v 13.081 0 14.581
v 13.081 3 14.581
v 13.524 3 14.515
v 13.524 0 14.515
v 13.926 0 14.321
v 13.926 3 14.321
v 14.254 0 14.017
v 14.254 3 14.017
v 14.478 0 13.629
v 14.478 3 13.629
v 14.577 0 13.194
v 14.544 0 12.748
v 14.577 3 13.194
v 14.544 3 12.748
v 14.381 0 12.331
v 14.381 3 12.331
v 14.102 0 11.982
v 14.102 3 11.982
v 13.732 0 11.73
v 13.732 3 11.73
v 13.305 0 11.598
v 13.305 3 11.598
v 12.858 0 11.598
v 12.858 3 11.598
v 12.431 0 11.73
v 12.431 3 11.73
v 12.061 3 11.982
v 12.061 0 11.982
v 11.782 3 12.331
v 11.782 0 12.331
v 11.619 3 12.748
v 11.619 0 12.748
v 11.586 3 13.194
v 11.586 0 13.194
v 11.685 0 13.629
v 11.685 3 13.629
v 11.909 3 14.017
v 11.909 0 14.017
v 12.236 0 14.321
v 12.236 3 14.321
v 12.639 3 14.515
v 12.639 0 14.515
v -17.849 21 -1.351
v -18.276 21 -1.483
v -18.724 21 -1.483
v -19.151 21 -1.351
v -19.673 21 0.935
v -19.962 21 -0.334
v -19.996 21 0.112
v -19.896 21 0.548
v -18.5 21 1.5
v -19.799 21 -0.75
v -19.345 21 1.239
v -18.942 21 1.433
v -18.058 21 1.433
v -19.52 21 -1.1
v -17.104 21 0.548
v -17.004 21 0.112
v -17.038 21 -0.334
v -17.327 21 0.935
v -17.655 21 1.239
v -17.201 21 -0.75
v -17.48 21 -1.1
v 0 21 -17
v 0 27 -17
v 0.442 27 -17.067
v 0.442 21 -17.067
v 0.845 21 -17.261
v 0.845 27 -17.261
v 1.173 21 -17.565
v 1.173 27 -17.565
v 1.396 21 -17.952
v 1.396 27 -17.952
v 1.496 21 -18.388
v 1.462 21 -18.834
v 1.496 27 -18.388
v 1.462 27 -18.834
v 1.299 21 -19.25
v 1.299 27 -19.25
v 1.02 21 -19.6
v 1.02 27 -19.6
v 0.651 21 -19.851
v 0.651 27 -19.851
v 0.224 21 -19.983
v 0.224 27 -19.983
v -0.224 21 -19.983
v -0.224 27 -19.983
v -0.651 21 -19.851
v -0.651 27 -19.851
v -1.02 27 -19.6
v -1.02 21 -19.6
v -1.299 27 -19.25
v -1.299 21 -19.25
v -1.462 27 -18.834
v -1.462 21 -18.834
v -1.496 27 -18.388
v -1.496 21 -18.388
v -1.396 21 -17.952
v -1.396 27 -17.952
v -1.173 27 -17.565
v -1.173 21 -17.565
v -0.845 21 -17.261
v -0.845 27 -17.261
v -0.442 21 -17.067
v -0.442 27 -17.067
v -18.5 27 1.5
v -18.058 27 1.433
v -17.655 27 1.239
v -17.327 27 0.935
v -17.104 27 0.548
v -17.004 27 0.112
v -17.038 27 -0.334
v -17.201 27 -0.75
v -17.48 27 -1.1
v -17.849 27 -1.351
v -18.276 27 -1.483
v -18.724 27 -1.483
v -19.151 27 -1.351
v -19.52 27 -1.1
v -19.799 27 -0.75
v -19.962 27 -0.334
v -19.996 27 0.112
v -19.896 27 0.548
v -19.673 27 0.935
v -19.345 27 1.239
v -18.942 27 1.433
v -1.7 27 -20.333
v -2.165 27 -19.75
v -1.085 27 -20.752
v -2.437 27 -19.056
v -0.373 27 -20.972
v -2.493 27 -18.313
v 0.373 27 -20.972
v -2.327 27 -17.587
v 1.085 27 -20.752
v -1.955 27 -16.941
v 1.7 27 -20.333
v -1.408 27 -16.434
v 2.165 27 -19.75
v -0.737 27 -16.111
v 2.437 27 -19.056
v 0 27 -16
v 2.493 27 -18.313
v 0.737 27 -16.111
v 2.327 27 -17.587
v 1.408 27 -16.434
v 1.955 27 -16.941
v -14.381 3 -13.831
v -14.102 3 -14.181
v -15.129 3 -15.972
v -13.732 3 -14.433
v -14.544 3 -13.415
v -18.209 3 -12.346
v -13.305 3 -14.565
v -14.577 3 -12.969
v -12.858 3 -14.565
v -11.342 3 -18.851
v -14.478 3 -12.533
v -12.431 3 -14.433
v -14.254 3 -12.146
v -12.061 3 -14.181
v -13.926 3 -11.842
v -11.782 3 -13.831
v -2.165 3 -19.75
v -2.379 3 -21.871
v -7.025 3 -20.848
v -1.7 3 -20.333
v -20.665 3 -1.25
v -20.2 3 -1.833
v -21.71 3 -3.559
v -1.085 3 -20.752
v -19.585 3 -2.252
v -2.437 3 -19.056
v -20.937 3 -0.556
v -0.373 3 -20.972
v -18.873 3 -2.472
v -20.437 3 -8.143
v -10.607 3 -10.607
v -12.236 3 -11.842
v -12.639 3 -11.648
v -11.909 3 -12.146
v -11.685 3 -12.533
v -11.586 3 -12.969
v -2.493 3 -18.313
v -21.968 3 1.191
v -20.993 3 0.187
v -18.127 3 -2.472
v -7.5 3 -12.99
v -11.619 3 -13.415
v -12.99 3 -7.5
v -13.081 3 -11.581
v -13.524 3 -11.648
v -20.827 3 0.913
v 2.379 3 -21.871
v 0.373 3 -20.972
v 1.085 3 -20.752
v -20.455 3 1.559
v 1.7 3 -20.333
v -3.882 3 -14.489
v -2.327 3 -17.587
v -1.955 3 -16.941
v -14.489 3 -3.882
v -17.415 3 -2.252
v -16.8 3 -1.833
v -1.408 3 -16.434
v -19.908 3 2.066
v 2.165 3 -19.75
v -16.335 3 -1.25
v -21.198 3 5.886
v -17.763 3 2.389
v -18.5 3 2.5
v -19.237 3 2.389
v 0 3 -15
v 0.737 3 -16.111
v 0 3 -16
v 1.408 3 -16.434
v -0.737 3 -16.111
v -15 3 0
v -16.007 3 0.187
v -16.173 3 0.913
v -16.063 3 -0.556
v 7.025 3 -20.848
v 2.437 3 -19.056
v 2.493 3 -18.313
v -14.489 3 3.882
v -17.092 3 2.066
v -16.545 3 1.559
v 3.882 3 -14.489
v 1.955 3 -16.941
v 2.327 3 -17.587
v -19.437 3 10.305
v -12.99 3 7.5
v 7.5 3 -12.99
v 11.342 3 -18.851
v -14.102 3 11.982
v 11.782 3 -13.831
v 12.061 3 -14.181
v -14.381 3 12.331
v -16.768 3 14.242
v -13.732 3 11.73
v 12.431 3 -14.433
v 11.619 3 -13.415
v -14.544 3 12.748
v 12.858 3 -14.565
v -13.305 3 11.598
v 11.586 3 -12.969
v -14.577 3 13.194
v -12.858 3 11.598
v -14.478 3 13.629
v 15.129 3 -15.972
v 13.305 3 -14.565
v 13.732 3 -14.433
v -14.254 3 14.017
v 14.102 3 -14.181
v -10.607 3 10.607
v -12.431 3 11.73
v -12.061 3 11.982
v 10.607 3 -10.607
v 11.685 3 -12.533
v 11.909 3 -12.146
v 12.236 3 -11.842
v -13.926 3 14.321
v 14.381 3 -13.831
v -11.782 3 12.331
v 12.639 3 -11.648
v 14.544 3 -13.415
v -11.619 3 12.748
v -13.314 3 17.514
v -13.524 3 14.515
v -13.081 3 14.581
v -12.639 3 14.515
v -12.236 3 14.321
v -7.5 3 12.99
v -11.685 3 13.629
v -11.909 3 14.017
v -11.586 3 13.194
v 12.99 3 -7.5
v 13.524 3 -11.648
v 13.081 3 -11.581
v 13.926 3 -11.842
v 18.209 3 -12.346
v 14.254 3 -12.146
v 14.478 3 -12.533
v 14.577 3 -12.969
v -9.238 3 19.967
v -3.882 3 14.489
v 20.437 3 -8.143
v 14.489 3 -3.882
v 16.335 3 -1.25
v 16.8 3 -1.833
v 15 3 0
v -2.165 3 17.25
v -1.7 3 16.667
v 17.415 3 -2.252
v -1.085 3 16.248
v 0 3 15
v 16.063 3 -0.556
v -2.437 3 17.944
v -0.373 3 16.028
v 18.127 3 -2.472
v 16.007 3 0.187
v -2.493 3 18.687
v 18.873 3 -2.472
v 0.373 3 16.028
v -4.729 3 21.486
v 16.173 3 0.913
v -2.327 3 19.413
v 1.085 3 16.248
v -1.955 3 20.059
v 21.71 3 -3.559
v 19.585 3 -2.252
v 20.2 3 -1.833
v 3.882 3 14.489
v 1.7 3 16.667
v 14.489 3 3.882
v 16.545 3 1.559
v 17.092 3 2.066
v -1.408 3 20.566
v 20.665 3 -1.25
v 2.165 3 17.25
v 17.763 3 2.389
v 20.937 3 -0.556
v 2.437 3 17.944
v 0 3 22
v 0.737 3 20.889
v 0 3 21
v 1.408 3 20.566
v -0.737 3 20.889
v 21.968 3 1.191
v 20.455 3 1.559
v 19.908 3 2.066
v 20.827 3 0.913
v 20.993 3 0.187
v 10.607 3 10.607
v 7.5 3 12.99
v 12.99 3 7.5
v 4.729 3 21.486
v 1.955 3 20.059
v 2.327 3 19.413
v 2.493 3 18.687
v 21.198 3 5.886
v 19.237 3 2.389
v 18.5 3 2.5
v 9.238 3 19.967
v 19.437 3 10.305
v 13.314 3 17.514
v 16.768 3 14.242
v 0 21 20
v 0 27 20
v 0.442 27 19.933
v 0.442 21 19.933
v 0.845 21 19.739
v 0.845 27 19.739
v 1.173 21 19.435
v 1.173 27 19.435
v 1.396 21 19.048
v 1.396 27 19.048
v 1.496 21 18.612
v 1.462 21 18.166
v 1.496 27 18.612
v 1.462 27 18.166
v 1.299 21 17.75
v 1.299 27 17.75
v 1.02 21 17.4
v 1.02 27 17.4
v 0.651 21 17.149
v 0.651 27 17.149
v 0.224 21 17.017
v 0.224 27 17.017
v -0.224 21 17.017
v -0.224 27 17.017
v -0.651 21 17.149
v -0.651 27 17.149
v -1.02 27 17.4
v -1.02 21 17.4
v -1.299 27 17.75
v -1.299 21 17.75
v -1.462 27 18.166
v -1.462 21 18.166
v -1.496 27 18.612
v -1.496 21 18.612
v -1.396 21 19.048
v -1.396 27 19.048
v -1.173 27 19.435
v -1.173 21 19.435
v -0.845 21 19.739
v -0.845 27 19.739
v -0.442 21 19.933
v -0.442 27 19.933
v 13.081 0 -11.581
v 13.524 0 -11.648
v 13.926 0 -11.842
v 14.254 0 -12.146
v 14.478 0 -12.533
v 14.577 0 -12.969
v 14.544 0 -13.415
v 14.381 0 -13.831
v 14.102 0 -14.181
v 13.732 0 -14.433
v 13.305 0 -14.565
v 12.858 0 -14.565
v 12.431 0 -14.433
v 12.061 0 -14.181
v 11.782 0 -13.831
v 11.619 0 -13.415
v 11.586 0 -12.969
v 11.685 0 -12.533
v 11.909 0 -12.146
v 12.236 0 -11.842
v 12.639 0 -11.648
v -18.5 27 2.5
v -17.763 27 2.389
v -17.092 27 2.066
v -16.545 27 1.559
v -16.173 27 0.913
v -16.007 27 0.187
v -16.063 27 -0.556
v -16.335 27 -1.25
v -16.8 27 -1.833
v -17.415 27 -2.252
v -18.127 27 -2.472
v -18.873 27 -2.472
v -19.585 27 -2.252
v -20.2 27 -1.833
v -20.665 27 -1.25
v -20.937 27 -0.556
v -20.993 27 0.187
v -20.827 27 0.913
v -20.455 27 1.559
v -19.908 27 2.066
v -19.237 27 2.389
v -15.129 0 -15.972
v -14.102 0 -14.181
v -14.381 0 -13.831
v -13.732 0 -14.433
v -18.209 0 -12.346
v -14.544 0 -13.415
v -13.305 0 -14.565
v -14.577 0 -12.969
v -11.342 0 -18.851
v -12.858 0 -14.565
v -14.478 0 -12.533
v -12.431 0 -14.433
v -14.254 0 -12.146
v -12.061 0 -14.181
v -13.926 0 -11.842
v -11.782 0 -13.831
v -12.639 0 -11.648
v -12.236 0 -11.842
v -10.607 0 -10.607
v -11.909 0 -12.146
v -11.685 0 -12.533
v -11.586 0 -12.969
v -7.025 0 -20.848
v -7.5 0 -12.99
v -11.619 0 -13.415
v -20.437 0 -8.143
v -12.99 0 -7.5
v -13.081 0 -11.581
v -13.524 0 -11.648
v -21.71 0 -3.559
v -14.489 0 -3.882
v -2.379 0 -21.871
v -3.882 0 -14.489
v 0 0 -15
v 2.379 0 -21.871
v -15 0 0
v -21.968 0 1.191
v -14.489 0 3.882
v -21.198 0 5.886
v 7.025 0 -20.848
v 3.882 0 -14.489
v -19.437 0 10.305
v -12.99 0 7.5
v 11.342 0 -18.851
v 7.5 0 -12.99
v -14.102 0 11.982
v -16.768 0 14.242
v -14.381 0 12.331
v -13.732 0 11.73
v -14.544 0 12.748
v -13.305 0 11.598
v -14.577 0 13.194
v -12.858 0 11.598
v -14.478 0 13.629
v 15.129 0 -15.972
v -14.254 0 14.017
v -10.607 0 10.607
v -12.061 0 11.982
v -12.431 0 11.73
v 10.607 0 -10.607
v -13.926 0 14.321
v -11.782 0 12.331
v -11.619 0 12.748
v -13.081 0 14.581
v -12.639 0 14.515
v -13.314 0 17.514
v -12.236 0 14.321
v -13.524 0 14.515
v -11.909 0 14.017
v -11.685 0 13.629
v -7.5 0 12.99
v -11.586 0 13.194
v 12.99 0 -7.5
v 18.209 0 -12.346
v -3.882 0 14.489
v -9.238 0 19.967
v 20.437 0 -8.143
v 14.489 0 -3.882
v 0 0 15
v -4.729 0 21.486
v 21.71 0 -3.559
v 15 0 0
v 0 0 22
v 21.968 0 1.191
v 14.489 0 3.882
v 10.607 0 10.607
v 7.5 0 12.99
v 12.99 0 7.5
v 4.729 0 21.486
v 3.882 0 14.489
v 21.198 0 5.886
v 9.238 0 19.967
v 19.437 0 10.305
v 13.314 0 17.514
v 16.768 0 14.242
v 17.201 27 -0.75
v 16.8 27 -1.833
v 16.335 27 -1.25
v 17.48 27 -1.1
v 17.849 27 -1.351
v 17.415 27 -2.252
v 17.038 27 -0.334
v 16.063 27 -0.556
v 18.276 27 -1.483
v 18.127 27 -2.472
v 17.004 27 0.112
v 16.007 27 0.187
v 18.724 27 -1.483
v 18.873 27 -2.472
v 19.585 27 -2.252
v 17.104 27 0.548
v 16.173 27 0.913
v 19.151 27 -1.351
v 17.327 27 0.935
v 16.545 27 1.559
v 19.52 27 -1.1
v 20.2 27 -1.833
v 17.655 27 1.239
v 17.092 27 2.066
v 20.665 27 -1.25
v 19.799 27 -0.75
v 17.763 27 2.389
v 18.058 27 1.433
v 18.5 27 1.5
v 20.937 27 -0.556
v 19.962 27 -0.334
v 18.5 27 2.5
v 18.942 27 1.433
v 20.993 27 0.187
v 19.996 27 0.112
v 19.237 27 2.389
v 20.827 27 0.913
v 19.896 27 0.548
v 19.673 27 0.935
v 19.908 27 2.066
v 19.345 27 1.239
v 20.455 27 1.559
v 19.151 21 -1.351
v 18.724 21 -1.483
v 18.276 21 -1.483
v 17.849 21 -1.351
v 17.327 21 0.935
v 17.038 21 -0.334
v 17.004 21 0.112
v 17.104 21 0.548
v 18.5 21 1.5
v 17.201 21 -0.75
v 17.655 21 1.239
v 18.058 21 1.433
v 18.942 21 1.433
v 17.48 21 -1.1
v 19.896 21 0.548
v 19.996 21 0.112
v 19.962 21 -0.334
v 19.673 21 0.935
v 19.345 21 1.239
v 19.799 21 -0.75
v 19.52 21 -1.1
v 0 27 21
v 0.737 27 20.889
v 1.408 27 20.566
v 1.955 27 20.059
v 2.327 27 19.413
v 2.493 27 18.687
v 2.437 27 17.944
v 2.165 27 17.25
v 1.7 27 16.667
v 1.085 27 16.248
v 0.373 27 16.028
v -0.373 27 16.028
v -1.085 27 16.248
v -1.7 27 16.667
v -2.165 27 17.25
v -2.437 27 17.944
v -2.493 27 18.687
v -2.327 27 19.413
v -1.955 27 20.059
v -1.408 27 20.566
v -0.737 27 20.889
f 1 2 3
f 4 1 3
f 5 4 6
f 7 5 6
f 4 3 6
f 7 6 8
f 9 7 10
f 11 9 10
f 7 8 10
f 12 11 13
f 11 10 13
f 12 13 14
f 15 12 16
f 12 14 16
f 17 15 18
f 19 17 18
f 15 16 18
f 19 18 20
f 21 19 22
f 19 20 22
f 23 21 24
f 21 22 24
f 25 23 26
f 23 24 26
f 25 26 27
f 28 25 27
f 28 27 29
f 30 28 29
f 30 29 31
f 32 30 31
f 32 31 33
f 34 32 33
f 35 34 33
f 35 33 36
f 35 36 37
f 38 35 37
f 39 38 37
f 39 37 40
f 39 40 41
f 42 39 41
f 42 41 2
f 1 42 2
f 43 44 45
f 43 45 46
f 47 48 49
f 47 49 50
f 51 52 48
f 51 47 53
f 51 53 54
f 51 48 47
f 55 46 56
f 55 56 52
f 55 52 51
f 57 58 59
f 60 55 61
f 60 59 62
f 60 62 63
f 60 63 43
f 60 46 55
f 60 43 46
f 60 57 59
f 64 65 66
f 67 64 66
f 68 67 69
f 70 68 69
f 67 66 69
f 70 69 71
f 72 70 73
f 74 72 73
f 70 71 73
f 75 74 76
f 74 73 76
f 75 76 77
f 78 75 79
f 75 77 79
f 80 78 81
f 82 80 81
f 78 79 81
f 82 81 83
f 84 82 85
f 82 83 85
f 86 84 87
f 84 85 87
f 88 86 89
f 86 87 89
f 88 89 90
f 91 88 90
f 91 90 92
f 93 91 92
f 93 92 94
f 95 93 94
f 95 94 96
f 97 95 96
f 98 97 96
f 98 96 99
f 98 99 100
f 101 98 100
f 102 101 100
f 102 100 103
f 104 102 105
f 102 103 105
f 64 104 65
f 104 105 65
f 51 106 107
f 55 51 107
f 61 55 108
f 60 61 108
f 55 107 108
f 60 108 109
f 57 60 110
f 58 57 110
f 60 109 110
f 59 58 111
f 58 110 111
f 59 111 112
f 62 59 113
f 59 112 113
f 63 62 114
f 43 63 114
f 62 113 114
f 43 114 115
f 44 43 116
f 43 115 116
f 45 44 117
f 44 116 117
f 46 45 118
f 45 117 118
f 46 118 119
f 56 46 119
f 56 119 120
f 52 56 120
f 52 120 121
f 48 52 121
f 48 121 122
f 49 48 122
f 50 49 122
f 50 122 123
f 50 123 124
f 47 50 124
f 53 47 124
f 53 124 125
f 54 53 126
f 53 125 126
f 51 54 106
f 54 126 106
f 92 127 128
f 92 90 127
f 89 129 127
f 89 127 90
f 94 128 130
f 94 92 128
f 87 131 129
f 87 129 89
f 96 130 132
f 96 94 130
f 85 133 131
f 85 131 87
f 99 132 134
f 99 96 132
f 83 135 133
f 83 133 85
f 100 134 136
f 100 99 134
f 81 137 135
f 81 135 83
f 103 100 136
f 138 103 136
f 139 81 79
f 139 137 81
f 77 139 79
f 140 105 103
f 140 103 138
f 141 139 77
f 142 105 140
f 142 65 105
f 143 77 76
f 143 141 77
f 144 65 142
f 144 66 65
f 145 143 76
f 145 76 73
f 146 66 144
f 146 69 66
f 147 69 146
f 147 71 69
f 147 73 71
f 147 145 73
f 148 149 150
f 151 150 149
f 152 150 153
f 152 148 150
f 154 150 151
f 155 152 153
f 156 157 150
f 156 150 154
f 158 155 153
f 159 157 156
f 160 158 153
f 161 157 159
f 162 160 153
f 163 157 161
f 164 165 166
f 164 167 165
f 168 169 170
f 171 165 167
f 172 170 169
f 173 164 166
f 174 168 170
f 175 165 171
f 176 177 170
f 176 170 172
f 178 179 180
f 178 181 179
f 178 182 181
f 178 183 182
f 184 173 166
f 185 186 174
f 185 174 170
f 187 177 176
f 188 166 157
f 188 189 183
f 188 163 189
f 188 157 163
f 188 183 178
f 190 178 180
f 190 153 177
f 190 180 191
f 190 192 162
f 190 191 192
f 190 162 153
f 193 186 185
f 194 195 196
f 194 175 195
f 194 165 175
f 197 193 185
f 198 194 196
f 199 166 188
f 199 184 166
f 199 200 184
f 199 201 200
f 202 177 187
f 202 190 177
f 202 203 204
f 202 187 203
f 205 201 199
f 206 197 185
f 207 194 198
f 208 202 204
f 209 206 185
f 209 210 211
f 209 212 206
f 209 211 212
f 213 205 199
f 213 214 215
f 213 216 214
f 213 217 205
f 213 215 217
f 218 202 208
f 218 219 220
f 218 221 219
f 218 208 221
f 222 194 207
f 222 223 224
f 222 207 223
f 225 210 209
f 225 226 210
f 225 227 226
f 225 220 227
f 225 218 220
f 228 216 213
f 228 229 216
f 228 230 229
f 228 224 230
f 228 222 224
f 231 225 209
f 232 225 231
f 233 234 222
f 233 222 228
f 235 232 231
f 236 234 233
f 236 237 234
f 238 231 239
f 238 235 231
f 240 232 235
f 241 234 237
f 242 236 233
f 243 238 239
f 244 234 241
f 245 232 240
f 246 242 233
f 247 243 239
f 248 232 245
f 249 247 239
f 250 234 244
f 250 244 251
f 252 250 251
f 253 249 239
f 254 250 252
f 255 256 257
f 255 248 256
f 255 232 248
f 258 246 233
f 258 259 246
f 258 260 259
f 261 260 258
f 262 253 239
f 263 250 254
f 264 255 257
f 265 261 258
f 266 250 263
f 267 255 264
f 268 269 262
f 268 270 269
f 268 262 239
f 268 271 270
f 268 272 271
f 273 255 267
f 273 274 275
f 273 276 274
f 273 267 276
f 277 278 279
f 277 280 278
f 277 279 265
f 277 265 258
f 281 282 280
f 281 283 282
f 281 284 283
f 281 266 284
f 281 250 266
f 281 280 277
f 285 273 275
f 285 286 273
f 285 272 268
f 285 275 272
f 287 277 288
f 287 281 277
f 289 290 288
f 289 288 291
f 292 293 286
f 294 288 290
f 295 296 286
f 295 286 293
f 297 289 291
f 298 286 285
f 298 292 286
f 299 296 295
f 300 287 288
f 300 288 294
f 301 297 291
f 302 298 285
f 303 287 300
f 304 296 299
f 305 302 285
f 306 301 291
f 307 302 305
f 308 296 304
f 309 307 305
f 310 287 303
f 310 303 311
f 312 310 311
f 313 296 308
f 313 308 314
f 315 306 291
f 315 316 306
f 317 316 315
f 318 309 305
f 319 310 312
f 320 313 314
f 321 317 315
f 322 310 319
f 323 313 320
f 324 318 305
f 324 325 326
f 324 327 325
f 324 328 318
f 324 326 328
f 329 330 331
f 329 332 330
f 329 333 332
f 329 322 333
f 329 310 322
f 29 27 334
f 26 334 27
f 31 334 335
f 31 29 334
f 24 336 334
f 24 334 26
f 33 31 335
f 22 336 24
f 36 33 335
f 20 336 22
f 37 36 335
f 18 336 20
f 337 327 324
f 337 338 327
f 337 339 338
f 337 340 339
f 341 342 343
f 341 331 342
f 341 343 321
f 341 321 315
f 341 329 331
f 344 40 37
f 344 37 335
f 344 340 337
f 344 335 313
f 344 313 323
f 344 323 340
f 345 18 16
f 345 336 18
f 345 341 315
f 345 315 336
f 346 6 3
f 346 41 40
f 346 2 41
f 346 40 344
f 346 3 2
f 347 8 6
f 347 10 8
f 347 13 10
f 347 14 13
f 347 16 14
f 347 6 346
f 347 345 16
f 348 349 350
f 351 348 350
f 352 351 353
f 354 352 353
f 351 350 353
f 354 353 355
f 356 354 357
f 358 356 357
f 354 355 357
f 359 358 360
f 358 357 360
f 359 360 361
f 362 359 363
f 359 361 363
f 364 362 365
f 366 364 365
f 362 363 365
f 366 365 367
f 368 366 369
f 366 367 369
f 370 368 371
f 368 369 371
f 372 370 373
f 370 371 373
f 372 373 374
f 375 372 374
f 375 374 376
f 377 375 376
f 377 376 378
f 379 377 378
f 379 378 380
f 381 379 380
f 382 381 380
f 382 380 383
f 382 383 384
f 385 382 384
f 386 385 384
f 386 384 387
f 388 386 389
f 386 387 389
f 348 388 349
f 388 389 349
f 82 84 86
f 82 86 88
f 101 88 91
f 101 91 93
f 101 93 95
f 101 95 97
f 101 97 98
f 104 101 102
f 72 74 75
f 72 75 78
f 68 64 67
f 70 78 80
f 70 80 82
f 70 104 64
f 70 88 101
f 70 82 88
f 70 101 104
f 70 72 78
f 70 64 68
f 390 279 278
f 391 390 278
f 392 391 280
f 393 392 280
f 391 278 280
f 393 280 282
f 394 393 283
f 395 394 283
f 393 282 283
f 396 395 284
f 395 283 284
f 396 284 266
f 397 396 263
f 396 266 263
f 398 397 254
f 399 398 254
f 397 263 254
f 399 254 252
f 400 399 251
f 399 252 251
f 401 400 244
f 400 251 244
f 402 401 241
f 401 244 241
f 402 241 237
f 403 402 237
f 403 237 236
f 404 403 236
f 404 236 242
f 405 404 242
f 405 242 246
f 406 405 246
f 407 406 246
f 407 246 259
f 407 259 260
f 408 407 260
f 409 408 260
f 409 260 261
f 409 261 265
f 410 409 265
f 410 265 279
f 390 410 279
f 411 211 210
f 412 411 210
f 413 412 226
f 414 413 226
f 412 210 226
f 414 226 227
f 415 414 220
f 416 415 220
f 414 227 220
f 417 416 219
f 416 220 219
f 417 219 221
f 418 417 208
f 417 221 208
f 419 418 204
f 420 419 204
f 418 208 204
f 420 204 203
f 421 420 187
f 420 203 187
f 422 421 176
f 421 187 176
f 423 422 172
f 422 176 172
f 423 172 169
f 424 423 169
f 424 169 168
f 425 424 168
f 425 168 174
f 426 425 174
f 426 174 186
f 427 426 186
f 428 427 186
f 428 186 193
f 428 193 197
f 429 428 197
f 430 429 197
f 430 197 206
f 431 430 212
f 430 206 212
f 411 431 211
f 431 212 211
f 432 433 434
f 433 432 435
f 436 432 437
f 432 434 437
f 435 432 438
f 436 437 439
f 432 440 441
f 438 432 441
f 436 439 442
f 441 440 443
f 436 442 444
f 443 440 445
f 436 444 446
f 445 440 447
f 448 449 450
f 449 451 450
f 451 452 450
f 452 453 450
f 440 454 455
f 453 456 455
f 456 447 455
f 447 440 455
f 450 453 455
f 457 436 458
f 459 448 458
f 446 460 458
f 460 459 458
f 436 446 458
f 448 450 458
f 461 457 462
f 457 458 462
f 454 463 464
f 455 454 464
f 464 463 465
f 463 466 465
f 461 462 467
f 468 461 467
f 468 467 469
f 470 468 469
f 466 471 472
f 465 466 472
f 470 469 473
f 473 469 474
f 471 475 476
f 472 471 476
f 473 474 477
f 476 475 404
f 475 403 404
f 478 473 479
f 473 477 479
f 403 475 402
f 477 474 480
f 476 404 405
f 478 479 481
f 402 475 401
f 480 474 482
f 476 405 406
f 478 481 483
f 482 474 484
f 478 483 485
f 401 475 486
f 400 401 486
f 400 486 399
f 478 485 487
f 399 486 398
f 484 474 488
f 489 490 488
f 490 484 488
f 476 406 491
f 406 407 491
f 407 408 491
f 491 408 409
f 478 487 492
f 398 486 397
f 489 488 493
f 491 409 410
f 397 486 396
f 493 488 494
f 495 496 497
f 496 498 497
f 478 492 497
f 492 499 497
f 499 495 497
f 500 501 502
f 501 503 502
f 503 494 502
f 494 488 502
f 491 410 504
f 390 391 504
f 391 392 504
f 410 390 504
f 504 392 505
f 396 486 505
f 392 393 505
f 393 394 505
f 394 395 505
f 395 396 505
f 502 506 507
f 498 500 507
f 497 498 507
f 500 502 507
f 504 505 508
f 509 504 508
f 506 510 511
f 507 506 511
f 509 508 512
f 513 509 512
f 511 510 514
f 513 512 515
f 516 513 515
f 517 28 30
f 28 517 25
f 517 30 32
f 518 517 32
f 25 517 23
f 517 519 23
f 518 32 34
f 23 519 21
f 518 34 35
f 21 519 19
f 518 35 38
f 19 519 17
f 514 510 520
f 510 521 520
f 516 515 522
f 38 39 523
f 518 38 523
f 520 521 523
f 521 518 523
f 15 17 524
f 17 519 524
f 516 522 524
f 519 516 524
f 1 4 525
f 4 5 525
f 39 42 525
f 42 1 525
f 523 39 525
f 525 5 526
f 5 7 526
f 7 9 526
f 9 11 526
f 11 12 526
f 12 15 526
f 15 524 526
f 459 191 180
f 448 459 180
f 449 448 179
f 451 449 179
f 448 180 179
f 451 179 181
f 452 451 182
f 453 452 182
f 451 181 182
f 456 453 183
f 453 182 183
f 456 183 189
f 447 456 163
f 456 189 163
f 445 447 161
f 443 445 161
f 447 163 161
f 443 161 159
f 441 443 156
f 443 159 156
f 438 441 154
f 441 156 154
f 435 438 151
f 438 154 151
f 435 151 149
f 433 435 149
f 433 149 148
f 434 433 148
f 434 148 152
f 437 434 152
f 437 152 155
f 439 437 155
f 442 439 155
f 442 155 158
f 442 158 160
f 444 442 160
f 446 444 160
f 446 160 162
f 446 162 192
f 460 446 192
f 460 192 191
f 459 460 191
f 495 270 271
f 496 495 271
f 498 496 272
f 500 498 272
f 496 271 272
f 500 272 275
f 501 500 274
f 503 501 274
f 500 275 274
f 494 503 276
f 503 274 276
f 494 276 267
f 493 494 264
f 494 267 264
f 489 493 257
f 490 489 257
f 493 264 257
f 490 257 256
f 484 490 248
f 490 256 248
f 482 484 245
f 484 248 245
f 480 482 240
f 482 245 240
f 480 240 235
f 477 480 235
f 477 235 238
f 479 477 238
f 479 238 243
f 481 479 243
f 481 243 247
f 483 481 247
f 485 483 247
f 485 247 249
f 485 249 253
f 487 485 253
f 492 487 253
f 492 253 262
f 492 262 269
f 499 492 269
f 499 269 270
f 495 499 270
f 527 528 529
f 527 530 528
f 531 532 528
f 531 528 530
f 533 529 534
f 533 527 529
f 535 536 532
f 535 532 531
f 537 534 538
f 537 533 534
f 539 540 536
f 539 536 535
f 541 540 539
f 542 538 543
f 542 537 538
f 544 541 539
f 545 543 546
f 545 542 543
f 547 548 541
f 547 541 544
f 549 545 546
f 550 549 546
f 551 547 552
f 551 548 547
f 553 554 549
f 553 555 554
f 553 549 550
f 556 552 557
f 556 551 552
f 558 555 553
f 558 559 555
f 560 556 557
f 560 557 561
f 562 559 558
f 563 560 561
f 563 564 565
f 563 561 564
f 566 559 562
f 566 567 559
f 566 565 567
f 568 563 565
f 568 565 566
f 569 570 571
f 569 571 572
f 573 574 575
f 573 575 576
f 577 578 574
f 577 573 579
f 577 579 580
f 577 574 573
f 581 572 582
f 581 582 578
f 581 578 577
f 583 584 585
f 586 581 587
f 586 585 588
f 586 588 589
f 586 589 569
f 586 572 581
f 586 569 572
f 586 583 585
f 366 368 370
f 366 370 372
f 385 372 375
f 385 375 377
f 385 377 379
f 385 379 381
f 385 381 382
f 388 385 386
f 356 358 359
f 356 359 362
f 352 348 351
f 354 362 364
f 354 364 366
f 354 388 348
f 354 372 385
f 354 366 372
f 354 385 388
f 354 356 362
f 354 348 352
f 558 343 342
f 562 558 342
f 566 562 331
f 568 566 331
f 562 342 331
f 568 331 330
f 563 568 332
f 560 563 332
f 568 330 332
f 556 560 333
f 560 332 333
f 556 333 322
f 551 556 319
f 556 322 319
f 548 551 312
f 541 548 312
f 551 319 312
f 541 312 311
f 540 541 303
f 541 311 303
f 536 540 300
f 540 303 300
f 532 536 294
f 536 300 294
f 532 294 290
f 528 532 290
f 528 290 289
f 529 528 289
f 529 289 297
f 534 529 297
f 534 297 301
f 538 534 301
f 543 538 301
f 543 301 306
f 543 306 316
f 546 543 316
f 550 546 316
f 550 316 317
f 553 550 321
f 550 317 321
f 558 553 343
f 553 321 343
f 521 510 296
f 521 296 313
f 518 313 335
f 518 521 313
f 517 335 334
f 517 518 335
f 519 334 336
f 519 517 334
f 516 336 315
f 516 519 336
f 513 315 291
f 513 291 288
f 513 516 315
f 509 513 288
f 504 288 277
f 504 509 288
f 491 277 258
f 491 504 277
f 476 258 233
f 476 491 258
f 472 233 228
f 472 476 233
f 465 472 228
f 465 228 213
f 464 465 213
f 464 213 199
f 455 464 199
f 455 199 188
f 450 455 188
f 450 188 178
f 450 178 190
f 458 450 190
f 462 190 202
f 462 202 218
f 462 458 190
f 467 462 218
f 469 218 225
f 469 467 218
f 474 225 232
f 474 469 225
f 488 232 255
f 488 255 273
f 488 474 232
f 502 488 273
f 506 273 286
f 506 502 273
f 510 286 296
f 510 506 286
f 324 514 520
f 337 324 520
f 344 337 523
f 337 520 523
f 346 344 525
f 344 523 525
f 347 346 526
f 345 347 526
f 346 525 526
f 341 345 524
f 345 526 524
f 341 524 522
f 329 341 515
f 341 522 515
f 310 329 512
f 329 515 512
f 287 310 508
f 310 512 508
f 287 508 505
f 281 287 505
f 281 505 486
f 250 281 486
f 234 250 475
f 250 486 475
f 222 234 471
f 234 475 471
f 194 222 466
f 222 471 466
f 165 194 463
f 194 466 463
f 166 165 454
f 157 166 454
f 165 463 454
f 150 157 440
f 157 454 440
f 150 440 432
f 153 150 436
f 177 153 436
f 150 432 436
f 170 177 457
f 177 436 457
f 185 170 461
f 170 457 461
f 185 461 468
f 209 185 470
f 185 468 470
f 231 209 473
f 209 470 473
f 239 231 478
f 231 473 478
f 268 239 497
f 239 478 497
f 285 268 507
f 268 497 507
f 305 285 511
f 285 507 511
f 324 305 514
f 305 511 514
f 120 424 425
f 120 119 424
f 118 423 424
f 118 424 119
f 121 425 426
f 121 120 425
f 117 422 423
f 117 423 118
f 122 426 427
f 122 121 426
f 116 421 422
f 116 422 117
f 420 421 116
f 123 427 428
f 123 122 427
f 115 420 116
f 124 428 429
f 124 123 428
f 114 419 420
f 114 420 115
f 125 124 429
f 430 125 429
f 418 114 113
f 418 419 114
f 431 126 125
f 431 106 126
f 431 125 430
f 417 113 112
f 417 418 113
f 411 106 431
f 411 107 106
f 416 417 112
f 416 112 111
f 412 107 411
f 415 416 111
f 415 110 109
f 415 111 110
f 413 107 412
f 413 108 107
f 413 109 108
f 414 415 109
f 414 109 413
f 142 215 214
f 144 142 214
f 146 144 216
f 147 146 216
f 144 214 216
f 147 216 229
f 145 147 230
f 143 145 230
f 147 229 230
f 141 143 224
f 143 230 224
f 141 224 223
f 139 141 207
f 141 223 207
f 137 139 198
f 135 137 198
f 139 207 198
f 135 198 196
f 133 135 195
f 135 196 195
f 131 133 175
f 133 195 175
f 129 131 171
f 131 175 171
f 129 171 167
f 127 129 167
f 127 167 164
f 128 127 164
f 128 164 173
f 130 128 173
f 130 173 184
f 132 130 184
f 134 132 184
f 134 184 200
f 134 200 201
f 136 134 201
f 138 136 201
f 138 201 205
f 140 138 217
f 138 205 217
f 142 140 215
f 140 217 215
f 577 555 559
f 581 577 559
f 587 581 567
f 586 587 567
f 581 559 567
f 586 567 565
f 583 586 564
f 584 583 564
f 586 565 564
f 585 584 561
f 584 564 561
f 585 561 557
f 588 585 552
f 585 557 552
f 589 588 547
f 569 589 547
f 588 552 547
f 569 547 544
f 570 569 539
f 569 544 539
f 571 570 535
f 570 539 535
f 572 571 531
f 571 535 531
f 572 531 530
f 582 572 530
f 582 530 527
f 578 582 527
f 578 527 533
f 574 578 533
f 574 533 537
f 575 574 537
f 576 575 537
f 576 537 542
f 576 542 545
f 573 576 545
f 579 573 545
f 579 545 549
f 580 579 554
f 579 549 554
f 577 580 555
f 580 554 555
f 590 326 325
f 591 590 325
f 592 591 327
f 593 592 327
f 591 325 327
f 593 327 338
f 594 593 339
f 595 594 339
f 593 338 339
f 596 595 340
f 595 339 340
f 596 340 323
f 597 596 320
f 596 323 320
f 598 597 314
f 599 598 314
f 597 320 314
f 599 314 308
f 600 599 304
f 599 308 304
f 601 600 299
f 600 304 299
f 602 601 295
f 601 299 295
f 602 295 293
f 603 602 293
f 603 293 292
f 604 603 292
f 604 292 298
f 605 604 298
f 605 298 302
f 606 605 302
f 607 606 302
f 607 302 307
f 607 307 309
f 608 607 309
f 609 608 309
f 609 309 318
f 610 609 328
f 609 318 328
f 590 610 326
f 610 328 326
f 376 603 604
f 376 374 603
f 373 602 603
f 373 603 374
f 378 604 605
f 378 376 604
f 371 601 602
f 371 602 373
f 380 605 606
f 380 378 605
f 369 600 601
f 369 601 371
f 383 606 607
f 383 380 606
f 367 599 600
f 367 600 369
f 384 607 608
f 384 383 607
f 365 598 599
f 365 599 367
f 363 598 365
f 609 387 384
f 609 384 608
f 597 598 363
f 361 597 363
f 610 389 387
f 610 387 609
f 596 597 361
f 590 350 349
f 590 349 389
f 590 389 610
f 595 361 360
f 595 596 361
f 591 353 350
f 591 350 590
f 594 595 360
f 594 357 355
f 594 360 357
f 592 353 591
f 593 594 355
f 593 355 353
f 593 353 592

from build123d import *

# Parameters (mm, degrees)
SKETCH1_R           = 22
SKETCH1_R_2         = 15
BOSS_EXTRUDE1_DEPTH = 3
SKETCH3_R           = 2.5
BOSS_EXTRUDE2_DEPTH = 24
SKETCH4_R           = 1.5
CUT_EXTRUDE1_DEPTH  = 6
SKETCH5_R           = 1.5
CUT_EXTRUDE2_DEPTH  = 6


with BuildPart() as part:
    # Sketch1 → Boss-Extrude1 (new body)
    with BuildSketch(Plane(origin=(0, 0, 0), x_dir=(1, 0, 0), z_dir=(0, 1, 0))):
        with Locations(Location((0, 0, 0), (0, 0, 270))):
            Circle(SKETCH1_R)
        with Locations(Location((0, 0, 0), (0, 0, 270))):
            Circle(SKETCH1_R_2, mode=Mode.SUBTRACT)
    extrude(amount=BOSS_EXTRUDE1_DEPTH)

    # Sketch3 → Boss-Extrude2 (add)
    with BuildSketch(Plane(origin=(0, 3, 0), x_dir=(1, 0, 0), z_dir=(0, 1, 0))):
        with Locations(Location((0, 18.5, 0), (0, 0, 270))):
            Circle(SKETCH3_R)
        with Locations(Location((18.5, 0, 0), (0, 0, 270))):
            Circle(SKETCH3_R)
        with Locations(Location((0, -18.5, 0), (0, 0, 270))):
            Circle(SKETCH3_R)
        with Locations(Location((-18.5, 0, 0), (0, 0, 270))):
            Circle(SKETCH3_R)
    extrude(amount=BOSS_EXTRUDE2_DEPTH)

    # Sketch4 → Cut-Extrude1 (cut)
    with BuildSketch(Plane(origin=(0, 27, 0), x_dir=(1, 0, 0), z_dir=(0, 1, 0))):
        with Locations(Location((-18.5, 0, 0), (0, 0, 270))):
            Circle(SKETCH4_R)
        with Locations(Location((0, 18.5, 0), (0, 0, 270))):
            Circle(SKETCH4_R)
        with Locations(Location((18.5, 0, 0), (0, 0, 270))):
            Circle(SKETCH4_R)
        with Locations(Location((0, -18.5, 0), (0, 0, 270))):
            Circle(SKETCH4_R)
    extrude(amount=-CUT_EXTRUDE1_DEPTH, mode=Mode.SUBTRACT)

    # Sketch5 → Cut-Extrude2 (cut)
    with BuildSketch(Plane(origin=(0, 3, 0), x_dir=(1, 0, 0), z_dir=(0, 1, 0))):
        with Locations(Location((13.081475452, 13.081475452, 0), (0, 0, 270))):
            Circle(SKETCH5_R)
        with Locations(Location((13.081475452, -13.081475452, 0), (0, 0, 270))):
            Circle(SKETCH5_R)
        with Locations(Location((-13.081475452, -13.081475452, 0), (0, 0, 270))):
            Circle(SKETCH5_R)
        with Locations(Location((-13.081475452, 13.081475452, 0), (0, 0, 270))):
            Circle(SKETCH5_R)
    extrude(amount=-CUT_EXTRUDE2_DEPTH, mode=Mode.SUBTRACT)


solid = part.part
